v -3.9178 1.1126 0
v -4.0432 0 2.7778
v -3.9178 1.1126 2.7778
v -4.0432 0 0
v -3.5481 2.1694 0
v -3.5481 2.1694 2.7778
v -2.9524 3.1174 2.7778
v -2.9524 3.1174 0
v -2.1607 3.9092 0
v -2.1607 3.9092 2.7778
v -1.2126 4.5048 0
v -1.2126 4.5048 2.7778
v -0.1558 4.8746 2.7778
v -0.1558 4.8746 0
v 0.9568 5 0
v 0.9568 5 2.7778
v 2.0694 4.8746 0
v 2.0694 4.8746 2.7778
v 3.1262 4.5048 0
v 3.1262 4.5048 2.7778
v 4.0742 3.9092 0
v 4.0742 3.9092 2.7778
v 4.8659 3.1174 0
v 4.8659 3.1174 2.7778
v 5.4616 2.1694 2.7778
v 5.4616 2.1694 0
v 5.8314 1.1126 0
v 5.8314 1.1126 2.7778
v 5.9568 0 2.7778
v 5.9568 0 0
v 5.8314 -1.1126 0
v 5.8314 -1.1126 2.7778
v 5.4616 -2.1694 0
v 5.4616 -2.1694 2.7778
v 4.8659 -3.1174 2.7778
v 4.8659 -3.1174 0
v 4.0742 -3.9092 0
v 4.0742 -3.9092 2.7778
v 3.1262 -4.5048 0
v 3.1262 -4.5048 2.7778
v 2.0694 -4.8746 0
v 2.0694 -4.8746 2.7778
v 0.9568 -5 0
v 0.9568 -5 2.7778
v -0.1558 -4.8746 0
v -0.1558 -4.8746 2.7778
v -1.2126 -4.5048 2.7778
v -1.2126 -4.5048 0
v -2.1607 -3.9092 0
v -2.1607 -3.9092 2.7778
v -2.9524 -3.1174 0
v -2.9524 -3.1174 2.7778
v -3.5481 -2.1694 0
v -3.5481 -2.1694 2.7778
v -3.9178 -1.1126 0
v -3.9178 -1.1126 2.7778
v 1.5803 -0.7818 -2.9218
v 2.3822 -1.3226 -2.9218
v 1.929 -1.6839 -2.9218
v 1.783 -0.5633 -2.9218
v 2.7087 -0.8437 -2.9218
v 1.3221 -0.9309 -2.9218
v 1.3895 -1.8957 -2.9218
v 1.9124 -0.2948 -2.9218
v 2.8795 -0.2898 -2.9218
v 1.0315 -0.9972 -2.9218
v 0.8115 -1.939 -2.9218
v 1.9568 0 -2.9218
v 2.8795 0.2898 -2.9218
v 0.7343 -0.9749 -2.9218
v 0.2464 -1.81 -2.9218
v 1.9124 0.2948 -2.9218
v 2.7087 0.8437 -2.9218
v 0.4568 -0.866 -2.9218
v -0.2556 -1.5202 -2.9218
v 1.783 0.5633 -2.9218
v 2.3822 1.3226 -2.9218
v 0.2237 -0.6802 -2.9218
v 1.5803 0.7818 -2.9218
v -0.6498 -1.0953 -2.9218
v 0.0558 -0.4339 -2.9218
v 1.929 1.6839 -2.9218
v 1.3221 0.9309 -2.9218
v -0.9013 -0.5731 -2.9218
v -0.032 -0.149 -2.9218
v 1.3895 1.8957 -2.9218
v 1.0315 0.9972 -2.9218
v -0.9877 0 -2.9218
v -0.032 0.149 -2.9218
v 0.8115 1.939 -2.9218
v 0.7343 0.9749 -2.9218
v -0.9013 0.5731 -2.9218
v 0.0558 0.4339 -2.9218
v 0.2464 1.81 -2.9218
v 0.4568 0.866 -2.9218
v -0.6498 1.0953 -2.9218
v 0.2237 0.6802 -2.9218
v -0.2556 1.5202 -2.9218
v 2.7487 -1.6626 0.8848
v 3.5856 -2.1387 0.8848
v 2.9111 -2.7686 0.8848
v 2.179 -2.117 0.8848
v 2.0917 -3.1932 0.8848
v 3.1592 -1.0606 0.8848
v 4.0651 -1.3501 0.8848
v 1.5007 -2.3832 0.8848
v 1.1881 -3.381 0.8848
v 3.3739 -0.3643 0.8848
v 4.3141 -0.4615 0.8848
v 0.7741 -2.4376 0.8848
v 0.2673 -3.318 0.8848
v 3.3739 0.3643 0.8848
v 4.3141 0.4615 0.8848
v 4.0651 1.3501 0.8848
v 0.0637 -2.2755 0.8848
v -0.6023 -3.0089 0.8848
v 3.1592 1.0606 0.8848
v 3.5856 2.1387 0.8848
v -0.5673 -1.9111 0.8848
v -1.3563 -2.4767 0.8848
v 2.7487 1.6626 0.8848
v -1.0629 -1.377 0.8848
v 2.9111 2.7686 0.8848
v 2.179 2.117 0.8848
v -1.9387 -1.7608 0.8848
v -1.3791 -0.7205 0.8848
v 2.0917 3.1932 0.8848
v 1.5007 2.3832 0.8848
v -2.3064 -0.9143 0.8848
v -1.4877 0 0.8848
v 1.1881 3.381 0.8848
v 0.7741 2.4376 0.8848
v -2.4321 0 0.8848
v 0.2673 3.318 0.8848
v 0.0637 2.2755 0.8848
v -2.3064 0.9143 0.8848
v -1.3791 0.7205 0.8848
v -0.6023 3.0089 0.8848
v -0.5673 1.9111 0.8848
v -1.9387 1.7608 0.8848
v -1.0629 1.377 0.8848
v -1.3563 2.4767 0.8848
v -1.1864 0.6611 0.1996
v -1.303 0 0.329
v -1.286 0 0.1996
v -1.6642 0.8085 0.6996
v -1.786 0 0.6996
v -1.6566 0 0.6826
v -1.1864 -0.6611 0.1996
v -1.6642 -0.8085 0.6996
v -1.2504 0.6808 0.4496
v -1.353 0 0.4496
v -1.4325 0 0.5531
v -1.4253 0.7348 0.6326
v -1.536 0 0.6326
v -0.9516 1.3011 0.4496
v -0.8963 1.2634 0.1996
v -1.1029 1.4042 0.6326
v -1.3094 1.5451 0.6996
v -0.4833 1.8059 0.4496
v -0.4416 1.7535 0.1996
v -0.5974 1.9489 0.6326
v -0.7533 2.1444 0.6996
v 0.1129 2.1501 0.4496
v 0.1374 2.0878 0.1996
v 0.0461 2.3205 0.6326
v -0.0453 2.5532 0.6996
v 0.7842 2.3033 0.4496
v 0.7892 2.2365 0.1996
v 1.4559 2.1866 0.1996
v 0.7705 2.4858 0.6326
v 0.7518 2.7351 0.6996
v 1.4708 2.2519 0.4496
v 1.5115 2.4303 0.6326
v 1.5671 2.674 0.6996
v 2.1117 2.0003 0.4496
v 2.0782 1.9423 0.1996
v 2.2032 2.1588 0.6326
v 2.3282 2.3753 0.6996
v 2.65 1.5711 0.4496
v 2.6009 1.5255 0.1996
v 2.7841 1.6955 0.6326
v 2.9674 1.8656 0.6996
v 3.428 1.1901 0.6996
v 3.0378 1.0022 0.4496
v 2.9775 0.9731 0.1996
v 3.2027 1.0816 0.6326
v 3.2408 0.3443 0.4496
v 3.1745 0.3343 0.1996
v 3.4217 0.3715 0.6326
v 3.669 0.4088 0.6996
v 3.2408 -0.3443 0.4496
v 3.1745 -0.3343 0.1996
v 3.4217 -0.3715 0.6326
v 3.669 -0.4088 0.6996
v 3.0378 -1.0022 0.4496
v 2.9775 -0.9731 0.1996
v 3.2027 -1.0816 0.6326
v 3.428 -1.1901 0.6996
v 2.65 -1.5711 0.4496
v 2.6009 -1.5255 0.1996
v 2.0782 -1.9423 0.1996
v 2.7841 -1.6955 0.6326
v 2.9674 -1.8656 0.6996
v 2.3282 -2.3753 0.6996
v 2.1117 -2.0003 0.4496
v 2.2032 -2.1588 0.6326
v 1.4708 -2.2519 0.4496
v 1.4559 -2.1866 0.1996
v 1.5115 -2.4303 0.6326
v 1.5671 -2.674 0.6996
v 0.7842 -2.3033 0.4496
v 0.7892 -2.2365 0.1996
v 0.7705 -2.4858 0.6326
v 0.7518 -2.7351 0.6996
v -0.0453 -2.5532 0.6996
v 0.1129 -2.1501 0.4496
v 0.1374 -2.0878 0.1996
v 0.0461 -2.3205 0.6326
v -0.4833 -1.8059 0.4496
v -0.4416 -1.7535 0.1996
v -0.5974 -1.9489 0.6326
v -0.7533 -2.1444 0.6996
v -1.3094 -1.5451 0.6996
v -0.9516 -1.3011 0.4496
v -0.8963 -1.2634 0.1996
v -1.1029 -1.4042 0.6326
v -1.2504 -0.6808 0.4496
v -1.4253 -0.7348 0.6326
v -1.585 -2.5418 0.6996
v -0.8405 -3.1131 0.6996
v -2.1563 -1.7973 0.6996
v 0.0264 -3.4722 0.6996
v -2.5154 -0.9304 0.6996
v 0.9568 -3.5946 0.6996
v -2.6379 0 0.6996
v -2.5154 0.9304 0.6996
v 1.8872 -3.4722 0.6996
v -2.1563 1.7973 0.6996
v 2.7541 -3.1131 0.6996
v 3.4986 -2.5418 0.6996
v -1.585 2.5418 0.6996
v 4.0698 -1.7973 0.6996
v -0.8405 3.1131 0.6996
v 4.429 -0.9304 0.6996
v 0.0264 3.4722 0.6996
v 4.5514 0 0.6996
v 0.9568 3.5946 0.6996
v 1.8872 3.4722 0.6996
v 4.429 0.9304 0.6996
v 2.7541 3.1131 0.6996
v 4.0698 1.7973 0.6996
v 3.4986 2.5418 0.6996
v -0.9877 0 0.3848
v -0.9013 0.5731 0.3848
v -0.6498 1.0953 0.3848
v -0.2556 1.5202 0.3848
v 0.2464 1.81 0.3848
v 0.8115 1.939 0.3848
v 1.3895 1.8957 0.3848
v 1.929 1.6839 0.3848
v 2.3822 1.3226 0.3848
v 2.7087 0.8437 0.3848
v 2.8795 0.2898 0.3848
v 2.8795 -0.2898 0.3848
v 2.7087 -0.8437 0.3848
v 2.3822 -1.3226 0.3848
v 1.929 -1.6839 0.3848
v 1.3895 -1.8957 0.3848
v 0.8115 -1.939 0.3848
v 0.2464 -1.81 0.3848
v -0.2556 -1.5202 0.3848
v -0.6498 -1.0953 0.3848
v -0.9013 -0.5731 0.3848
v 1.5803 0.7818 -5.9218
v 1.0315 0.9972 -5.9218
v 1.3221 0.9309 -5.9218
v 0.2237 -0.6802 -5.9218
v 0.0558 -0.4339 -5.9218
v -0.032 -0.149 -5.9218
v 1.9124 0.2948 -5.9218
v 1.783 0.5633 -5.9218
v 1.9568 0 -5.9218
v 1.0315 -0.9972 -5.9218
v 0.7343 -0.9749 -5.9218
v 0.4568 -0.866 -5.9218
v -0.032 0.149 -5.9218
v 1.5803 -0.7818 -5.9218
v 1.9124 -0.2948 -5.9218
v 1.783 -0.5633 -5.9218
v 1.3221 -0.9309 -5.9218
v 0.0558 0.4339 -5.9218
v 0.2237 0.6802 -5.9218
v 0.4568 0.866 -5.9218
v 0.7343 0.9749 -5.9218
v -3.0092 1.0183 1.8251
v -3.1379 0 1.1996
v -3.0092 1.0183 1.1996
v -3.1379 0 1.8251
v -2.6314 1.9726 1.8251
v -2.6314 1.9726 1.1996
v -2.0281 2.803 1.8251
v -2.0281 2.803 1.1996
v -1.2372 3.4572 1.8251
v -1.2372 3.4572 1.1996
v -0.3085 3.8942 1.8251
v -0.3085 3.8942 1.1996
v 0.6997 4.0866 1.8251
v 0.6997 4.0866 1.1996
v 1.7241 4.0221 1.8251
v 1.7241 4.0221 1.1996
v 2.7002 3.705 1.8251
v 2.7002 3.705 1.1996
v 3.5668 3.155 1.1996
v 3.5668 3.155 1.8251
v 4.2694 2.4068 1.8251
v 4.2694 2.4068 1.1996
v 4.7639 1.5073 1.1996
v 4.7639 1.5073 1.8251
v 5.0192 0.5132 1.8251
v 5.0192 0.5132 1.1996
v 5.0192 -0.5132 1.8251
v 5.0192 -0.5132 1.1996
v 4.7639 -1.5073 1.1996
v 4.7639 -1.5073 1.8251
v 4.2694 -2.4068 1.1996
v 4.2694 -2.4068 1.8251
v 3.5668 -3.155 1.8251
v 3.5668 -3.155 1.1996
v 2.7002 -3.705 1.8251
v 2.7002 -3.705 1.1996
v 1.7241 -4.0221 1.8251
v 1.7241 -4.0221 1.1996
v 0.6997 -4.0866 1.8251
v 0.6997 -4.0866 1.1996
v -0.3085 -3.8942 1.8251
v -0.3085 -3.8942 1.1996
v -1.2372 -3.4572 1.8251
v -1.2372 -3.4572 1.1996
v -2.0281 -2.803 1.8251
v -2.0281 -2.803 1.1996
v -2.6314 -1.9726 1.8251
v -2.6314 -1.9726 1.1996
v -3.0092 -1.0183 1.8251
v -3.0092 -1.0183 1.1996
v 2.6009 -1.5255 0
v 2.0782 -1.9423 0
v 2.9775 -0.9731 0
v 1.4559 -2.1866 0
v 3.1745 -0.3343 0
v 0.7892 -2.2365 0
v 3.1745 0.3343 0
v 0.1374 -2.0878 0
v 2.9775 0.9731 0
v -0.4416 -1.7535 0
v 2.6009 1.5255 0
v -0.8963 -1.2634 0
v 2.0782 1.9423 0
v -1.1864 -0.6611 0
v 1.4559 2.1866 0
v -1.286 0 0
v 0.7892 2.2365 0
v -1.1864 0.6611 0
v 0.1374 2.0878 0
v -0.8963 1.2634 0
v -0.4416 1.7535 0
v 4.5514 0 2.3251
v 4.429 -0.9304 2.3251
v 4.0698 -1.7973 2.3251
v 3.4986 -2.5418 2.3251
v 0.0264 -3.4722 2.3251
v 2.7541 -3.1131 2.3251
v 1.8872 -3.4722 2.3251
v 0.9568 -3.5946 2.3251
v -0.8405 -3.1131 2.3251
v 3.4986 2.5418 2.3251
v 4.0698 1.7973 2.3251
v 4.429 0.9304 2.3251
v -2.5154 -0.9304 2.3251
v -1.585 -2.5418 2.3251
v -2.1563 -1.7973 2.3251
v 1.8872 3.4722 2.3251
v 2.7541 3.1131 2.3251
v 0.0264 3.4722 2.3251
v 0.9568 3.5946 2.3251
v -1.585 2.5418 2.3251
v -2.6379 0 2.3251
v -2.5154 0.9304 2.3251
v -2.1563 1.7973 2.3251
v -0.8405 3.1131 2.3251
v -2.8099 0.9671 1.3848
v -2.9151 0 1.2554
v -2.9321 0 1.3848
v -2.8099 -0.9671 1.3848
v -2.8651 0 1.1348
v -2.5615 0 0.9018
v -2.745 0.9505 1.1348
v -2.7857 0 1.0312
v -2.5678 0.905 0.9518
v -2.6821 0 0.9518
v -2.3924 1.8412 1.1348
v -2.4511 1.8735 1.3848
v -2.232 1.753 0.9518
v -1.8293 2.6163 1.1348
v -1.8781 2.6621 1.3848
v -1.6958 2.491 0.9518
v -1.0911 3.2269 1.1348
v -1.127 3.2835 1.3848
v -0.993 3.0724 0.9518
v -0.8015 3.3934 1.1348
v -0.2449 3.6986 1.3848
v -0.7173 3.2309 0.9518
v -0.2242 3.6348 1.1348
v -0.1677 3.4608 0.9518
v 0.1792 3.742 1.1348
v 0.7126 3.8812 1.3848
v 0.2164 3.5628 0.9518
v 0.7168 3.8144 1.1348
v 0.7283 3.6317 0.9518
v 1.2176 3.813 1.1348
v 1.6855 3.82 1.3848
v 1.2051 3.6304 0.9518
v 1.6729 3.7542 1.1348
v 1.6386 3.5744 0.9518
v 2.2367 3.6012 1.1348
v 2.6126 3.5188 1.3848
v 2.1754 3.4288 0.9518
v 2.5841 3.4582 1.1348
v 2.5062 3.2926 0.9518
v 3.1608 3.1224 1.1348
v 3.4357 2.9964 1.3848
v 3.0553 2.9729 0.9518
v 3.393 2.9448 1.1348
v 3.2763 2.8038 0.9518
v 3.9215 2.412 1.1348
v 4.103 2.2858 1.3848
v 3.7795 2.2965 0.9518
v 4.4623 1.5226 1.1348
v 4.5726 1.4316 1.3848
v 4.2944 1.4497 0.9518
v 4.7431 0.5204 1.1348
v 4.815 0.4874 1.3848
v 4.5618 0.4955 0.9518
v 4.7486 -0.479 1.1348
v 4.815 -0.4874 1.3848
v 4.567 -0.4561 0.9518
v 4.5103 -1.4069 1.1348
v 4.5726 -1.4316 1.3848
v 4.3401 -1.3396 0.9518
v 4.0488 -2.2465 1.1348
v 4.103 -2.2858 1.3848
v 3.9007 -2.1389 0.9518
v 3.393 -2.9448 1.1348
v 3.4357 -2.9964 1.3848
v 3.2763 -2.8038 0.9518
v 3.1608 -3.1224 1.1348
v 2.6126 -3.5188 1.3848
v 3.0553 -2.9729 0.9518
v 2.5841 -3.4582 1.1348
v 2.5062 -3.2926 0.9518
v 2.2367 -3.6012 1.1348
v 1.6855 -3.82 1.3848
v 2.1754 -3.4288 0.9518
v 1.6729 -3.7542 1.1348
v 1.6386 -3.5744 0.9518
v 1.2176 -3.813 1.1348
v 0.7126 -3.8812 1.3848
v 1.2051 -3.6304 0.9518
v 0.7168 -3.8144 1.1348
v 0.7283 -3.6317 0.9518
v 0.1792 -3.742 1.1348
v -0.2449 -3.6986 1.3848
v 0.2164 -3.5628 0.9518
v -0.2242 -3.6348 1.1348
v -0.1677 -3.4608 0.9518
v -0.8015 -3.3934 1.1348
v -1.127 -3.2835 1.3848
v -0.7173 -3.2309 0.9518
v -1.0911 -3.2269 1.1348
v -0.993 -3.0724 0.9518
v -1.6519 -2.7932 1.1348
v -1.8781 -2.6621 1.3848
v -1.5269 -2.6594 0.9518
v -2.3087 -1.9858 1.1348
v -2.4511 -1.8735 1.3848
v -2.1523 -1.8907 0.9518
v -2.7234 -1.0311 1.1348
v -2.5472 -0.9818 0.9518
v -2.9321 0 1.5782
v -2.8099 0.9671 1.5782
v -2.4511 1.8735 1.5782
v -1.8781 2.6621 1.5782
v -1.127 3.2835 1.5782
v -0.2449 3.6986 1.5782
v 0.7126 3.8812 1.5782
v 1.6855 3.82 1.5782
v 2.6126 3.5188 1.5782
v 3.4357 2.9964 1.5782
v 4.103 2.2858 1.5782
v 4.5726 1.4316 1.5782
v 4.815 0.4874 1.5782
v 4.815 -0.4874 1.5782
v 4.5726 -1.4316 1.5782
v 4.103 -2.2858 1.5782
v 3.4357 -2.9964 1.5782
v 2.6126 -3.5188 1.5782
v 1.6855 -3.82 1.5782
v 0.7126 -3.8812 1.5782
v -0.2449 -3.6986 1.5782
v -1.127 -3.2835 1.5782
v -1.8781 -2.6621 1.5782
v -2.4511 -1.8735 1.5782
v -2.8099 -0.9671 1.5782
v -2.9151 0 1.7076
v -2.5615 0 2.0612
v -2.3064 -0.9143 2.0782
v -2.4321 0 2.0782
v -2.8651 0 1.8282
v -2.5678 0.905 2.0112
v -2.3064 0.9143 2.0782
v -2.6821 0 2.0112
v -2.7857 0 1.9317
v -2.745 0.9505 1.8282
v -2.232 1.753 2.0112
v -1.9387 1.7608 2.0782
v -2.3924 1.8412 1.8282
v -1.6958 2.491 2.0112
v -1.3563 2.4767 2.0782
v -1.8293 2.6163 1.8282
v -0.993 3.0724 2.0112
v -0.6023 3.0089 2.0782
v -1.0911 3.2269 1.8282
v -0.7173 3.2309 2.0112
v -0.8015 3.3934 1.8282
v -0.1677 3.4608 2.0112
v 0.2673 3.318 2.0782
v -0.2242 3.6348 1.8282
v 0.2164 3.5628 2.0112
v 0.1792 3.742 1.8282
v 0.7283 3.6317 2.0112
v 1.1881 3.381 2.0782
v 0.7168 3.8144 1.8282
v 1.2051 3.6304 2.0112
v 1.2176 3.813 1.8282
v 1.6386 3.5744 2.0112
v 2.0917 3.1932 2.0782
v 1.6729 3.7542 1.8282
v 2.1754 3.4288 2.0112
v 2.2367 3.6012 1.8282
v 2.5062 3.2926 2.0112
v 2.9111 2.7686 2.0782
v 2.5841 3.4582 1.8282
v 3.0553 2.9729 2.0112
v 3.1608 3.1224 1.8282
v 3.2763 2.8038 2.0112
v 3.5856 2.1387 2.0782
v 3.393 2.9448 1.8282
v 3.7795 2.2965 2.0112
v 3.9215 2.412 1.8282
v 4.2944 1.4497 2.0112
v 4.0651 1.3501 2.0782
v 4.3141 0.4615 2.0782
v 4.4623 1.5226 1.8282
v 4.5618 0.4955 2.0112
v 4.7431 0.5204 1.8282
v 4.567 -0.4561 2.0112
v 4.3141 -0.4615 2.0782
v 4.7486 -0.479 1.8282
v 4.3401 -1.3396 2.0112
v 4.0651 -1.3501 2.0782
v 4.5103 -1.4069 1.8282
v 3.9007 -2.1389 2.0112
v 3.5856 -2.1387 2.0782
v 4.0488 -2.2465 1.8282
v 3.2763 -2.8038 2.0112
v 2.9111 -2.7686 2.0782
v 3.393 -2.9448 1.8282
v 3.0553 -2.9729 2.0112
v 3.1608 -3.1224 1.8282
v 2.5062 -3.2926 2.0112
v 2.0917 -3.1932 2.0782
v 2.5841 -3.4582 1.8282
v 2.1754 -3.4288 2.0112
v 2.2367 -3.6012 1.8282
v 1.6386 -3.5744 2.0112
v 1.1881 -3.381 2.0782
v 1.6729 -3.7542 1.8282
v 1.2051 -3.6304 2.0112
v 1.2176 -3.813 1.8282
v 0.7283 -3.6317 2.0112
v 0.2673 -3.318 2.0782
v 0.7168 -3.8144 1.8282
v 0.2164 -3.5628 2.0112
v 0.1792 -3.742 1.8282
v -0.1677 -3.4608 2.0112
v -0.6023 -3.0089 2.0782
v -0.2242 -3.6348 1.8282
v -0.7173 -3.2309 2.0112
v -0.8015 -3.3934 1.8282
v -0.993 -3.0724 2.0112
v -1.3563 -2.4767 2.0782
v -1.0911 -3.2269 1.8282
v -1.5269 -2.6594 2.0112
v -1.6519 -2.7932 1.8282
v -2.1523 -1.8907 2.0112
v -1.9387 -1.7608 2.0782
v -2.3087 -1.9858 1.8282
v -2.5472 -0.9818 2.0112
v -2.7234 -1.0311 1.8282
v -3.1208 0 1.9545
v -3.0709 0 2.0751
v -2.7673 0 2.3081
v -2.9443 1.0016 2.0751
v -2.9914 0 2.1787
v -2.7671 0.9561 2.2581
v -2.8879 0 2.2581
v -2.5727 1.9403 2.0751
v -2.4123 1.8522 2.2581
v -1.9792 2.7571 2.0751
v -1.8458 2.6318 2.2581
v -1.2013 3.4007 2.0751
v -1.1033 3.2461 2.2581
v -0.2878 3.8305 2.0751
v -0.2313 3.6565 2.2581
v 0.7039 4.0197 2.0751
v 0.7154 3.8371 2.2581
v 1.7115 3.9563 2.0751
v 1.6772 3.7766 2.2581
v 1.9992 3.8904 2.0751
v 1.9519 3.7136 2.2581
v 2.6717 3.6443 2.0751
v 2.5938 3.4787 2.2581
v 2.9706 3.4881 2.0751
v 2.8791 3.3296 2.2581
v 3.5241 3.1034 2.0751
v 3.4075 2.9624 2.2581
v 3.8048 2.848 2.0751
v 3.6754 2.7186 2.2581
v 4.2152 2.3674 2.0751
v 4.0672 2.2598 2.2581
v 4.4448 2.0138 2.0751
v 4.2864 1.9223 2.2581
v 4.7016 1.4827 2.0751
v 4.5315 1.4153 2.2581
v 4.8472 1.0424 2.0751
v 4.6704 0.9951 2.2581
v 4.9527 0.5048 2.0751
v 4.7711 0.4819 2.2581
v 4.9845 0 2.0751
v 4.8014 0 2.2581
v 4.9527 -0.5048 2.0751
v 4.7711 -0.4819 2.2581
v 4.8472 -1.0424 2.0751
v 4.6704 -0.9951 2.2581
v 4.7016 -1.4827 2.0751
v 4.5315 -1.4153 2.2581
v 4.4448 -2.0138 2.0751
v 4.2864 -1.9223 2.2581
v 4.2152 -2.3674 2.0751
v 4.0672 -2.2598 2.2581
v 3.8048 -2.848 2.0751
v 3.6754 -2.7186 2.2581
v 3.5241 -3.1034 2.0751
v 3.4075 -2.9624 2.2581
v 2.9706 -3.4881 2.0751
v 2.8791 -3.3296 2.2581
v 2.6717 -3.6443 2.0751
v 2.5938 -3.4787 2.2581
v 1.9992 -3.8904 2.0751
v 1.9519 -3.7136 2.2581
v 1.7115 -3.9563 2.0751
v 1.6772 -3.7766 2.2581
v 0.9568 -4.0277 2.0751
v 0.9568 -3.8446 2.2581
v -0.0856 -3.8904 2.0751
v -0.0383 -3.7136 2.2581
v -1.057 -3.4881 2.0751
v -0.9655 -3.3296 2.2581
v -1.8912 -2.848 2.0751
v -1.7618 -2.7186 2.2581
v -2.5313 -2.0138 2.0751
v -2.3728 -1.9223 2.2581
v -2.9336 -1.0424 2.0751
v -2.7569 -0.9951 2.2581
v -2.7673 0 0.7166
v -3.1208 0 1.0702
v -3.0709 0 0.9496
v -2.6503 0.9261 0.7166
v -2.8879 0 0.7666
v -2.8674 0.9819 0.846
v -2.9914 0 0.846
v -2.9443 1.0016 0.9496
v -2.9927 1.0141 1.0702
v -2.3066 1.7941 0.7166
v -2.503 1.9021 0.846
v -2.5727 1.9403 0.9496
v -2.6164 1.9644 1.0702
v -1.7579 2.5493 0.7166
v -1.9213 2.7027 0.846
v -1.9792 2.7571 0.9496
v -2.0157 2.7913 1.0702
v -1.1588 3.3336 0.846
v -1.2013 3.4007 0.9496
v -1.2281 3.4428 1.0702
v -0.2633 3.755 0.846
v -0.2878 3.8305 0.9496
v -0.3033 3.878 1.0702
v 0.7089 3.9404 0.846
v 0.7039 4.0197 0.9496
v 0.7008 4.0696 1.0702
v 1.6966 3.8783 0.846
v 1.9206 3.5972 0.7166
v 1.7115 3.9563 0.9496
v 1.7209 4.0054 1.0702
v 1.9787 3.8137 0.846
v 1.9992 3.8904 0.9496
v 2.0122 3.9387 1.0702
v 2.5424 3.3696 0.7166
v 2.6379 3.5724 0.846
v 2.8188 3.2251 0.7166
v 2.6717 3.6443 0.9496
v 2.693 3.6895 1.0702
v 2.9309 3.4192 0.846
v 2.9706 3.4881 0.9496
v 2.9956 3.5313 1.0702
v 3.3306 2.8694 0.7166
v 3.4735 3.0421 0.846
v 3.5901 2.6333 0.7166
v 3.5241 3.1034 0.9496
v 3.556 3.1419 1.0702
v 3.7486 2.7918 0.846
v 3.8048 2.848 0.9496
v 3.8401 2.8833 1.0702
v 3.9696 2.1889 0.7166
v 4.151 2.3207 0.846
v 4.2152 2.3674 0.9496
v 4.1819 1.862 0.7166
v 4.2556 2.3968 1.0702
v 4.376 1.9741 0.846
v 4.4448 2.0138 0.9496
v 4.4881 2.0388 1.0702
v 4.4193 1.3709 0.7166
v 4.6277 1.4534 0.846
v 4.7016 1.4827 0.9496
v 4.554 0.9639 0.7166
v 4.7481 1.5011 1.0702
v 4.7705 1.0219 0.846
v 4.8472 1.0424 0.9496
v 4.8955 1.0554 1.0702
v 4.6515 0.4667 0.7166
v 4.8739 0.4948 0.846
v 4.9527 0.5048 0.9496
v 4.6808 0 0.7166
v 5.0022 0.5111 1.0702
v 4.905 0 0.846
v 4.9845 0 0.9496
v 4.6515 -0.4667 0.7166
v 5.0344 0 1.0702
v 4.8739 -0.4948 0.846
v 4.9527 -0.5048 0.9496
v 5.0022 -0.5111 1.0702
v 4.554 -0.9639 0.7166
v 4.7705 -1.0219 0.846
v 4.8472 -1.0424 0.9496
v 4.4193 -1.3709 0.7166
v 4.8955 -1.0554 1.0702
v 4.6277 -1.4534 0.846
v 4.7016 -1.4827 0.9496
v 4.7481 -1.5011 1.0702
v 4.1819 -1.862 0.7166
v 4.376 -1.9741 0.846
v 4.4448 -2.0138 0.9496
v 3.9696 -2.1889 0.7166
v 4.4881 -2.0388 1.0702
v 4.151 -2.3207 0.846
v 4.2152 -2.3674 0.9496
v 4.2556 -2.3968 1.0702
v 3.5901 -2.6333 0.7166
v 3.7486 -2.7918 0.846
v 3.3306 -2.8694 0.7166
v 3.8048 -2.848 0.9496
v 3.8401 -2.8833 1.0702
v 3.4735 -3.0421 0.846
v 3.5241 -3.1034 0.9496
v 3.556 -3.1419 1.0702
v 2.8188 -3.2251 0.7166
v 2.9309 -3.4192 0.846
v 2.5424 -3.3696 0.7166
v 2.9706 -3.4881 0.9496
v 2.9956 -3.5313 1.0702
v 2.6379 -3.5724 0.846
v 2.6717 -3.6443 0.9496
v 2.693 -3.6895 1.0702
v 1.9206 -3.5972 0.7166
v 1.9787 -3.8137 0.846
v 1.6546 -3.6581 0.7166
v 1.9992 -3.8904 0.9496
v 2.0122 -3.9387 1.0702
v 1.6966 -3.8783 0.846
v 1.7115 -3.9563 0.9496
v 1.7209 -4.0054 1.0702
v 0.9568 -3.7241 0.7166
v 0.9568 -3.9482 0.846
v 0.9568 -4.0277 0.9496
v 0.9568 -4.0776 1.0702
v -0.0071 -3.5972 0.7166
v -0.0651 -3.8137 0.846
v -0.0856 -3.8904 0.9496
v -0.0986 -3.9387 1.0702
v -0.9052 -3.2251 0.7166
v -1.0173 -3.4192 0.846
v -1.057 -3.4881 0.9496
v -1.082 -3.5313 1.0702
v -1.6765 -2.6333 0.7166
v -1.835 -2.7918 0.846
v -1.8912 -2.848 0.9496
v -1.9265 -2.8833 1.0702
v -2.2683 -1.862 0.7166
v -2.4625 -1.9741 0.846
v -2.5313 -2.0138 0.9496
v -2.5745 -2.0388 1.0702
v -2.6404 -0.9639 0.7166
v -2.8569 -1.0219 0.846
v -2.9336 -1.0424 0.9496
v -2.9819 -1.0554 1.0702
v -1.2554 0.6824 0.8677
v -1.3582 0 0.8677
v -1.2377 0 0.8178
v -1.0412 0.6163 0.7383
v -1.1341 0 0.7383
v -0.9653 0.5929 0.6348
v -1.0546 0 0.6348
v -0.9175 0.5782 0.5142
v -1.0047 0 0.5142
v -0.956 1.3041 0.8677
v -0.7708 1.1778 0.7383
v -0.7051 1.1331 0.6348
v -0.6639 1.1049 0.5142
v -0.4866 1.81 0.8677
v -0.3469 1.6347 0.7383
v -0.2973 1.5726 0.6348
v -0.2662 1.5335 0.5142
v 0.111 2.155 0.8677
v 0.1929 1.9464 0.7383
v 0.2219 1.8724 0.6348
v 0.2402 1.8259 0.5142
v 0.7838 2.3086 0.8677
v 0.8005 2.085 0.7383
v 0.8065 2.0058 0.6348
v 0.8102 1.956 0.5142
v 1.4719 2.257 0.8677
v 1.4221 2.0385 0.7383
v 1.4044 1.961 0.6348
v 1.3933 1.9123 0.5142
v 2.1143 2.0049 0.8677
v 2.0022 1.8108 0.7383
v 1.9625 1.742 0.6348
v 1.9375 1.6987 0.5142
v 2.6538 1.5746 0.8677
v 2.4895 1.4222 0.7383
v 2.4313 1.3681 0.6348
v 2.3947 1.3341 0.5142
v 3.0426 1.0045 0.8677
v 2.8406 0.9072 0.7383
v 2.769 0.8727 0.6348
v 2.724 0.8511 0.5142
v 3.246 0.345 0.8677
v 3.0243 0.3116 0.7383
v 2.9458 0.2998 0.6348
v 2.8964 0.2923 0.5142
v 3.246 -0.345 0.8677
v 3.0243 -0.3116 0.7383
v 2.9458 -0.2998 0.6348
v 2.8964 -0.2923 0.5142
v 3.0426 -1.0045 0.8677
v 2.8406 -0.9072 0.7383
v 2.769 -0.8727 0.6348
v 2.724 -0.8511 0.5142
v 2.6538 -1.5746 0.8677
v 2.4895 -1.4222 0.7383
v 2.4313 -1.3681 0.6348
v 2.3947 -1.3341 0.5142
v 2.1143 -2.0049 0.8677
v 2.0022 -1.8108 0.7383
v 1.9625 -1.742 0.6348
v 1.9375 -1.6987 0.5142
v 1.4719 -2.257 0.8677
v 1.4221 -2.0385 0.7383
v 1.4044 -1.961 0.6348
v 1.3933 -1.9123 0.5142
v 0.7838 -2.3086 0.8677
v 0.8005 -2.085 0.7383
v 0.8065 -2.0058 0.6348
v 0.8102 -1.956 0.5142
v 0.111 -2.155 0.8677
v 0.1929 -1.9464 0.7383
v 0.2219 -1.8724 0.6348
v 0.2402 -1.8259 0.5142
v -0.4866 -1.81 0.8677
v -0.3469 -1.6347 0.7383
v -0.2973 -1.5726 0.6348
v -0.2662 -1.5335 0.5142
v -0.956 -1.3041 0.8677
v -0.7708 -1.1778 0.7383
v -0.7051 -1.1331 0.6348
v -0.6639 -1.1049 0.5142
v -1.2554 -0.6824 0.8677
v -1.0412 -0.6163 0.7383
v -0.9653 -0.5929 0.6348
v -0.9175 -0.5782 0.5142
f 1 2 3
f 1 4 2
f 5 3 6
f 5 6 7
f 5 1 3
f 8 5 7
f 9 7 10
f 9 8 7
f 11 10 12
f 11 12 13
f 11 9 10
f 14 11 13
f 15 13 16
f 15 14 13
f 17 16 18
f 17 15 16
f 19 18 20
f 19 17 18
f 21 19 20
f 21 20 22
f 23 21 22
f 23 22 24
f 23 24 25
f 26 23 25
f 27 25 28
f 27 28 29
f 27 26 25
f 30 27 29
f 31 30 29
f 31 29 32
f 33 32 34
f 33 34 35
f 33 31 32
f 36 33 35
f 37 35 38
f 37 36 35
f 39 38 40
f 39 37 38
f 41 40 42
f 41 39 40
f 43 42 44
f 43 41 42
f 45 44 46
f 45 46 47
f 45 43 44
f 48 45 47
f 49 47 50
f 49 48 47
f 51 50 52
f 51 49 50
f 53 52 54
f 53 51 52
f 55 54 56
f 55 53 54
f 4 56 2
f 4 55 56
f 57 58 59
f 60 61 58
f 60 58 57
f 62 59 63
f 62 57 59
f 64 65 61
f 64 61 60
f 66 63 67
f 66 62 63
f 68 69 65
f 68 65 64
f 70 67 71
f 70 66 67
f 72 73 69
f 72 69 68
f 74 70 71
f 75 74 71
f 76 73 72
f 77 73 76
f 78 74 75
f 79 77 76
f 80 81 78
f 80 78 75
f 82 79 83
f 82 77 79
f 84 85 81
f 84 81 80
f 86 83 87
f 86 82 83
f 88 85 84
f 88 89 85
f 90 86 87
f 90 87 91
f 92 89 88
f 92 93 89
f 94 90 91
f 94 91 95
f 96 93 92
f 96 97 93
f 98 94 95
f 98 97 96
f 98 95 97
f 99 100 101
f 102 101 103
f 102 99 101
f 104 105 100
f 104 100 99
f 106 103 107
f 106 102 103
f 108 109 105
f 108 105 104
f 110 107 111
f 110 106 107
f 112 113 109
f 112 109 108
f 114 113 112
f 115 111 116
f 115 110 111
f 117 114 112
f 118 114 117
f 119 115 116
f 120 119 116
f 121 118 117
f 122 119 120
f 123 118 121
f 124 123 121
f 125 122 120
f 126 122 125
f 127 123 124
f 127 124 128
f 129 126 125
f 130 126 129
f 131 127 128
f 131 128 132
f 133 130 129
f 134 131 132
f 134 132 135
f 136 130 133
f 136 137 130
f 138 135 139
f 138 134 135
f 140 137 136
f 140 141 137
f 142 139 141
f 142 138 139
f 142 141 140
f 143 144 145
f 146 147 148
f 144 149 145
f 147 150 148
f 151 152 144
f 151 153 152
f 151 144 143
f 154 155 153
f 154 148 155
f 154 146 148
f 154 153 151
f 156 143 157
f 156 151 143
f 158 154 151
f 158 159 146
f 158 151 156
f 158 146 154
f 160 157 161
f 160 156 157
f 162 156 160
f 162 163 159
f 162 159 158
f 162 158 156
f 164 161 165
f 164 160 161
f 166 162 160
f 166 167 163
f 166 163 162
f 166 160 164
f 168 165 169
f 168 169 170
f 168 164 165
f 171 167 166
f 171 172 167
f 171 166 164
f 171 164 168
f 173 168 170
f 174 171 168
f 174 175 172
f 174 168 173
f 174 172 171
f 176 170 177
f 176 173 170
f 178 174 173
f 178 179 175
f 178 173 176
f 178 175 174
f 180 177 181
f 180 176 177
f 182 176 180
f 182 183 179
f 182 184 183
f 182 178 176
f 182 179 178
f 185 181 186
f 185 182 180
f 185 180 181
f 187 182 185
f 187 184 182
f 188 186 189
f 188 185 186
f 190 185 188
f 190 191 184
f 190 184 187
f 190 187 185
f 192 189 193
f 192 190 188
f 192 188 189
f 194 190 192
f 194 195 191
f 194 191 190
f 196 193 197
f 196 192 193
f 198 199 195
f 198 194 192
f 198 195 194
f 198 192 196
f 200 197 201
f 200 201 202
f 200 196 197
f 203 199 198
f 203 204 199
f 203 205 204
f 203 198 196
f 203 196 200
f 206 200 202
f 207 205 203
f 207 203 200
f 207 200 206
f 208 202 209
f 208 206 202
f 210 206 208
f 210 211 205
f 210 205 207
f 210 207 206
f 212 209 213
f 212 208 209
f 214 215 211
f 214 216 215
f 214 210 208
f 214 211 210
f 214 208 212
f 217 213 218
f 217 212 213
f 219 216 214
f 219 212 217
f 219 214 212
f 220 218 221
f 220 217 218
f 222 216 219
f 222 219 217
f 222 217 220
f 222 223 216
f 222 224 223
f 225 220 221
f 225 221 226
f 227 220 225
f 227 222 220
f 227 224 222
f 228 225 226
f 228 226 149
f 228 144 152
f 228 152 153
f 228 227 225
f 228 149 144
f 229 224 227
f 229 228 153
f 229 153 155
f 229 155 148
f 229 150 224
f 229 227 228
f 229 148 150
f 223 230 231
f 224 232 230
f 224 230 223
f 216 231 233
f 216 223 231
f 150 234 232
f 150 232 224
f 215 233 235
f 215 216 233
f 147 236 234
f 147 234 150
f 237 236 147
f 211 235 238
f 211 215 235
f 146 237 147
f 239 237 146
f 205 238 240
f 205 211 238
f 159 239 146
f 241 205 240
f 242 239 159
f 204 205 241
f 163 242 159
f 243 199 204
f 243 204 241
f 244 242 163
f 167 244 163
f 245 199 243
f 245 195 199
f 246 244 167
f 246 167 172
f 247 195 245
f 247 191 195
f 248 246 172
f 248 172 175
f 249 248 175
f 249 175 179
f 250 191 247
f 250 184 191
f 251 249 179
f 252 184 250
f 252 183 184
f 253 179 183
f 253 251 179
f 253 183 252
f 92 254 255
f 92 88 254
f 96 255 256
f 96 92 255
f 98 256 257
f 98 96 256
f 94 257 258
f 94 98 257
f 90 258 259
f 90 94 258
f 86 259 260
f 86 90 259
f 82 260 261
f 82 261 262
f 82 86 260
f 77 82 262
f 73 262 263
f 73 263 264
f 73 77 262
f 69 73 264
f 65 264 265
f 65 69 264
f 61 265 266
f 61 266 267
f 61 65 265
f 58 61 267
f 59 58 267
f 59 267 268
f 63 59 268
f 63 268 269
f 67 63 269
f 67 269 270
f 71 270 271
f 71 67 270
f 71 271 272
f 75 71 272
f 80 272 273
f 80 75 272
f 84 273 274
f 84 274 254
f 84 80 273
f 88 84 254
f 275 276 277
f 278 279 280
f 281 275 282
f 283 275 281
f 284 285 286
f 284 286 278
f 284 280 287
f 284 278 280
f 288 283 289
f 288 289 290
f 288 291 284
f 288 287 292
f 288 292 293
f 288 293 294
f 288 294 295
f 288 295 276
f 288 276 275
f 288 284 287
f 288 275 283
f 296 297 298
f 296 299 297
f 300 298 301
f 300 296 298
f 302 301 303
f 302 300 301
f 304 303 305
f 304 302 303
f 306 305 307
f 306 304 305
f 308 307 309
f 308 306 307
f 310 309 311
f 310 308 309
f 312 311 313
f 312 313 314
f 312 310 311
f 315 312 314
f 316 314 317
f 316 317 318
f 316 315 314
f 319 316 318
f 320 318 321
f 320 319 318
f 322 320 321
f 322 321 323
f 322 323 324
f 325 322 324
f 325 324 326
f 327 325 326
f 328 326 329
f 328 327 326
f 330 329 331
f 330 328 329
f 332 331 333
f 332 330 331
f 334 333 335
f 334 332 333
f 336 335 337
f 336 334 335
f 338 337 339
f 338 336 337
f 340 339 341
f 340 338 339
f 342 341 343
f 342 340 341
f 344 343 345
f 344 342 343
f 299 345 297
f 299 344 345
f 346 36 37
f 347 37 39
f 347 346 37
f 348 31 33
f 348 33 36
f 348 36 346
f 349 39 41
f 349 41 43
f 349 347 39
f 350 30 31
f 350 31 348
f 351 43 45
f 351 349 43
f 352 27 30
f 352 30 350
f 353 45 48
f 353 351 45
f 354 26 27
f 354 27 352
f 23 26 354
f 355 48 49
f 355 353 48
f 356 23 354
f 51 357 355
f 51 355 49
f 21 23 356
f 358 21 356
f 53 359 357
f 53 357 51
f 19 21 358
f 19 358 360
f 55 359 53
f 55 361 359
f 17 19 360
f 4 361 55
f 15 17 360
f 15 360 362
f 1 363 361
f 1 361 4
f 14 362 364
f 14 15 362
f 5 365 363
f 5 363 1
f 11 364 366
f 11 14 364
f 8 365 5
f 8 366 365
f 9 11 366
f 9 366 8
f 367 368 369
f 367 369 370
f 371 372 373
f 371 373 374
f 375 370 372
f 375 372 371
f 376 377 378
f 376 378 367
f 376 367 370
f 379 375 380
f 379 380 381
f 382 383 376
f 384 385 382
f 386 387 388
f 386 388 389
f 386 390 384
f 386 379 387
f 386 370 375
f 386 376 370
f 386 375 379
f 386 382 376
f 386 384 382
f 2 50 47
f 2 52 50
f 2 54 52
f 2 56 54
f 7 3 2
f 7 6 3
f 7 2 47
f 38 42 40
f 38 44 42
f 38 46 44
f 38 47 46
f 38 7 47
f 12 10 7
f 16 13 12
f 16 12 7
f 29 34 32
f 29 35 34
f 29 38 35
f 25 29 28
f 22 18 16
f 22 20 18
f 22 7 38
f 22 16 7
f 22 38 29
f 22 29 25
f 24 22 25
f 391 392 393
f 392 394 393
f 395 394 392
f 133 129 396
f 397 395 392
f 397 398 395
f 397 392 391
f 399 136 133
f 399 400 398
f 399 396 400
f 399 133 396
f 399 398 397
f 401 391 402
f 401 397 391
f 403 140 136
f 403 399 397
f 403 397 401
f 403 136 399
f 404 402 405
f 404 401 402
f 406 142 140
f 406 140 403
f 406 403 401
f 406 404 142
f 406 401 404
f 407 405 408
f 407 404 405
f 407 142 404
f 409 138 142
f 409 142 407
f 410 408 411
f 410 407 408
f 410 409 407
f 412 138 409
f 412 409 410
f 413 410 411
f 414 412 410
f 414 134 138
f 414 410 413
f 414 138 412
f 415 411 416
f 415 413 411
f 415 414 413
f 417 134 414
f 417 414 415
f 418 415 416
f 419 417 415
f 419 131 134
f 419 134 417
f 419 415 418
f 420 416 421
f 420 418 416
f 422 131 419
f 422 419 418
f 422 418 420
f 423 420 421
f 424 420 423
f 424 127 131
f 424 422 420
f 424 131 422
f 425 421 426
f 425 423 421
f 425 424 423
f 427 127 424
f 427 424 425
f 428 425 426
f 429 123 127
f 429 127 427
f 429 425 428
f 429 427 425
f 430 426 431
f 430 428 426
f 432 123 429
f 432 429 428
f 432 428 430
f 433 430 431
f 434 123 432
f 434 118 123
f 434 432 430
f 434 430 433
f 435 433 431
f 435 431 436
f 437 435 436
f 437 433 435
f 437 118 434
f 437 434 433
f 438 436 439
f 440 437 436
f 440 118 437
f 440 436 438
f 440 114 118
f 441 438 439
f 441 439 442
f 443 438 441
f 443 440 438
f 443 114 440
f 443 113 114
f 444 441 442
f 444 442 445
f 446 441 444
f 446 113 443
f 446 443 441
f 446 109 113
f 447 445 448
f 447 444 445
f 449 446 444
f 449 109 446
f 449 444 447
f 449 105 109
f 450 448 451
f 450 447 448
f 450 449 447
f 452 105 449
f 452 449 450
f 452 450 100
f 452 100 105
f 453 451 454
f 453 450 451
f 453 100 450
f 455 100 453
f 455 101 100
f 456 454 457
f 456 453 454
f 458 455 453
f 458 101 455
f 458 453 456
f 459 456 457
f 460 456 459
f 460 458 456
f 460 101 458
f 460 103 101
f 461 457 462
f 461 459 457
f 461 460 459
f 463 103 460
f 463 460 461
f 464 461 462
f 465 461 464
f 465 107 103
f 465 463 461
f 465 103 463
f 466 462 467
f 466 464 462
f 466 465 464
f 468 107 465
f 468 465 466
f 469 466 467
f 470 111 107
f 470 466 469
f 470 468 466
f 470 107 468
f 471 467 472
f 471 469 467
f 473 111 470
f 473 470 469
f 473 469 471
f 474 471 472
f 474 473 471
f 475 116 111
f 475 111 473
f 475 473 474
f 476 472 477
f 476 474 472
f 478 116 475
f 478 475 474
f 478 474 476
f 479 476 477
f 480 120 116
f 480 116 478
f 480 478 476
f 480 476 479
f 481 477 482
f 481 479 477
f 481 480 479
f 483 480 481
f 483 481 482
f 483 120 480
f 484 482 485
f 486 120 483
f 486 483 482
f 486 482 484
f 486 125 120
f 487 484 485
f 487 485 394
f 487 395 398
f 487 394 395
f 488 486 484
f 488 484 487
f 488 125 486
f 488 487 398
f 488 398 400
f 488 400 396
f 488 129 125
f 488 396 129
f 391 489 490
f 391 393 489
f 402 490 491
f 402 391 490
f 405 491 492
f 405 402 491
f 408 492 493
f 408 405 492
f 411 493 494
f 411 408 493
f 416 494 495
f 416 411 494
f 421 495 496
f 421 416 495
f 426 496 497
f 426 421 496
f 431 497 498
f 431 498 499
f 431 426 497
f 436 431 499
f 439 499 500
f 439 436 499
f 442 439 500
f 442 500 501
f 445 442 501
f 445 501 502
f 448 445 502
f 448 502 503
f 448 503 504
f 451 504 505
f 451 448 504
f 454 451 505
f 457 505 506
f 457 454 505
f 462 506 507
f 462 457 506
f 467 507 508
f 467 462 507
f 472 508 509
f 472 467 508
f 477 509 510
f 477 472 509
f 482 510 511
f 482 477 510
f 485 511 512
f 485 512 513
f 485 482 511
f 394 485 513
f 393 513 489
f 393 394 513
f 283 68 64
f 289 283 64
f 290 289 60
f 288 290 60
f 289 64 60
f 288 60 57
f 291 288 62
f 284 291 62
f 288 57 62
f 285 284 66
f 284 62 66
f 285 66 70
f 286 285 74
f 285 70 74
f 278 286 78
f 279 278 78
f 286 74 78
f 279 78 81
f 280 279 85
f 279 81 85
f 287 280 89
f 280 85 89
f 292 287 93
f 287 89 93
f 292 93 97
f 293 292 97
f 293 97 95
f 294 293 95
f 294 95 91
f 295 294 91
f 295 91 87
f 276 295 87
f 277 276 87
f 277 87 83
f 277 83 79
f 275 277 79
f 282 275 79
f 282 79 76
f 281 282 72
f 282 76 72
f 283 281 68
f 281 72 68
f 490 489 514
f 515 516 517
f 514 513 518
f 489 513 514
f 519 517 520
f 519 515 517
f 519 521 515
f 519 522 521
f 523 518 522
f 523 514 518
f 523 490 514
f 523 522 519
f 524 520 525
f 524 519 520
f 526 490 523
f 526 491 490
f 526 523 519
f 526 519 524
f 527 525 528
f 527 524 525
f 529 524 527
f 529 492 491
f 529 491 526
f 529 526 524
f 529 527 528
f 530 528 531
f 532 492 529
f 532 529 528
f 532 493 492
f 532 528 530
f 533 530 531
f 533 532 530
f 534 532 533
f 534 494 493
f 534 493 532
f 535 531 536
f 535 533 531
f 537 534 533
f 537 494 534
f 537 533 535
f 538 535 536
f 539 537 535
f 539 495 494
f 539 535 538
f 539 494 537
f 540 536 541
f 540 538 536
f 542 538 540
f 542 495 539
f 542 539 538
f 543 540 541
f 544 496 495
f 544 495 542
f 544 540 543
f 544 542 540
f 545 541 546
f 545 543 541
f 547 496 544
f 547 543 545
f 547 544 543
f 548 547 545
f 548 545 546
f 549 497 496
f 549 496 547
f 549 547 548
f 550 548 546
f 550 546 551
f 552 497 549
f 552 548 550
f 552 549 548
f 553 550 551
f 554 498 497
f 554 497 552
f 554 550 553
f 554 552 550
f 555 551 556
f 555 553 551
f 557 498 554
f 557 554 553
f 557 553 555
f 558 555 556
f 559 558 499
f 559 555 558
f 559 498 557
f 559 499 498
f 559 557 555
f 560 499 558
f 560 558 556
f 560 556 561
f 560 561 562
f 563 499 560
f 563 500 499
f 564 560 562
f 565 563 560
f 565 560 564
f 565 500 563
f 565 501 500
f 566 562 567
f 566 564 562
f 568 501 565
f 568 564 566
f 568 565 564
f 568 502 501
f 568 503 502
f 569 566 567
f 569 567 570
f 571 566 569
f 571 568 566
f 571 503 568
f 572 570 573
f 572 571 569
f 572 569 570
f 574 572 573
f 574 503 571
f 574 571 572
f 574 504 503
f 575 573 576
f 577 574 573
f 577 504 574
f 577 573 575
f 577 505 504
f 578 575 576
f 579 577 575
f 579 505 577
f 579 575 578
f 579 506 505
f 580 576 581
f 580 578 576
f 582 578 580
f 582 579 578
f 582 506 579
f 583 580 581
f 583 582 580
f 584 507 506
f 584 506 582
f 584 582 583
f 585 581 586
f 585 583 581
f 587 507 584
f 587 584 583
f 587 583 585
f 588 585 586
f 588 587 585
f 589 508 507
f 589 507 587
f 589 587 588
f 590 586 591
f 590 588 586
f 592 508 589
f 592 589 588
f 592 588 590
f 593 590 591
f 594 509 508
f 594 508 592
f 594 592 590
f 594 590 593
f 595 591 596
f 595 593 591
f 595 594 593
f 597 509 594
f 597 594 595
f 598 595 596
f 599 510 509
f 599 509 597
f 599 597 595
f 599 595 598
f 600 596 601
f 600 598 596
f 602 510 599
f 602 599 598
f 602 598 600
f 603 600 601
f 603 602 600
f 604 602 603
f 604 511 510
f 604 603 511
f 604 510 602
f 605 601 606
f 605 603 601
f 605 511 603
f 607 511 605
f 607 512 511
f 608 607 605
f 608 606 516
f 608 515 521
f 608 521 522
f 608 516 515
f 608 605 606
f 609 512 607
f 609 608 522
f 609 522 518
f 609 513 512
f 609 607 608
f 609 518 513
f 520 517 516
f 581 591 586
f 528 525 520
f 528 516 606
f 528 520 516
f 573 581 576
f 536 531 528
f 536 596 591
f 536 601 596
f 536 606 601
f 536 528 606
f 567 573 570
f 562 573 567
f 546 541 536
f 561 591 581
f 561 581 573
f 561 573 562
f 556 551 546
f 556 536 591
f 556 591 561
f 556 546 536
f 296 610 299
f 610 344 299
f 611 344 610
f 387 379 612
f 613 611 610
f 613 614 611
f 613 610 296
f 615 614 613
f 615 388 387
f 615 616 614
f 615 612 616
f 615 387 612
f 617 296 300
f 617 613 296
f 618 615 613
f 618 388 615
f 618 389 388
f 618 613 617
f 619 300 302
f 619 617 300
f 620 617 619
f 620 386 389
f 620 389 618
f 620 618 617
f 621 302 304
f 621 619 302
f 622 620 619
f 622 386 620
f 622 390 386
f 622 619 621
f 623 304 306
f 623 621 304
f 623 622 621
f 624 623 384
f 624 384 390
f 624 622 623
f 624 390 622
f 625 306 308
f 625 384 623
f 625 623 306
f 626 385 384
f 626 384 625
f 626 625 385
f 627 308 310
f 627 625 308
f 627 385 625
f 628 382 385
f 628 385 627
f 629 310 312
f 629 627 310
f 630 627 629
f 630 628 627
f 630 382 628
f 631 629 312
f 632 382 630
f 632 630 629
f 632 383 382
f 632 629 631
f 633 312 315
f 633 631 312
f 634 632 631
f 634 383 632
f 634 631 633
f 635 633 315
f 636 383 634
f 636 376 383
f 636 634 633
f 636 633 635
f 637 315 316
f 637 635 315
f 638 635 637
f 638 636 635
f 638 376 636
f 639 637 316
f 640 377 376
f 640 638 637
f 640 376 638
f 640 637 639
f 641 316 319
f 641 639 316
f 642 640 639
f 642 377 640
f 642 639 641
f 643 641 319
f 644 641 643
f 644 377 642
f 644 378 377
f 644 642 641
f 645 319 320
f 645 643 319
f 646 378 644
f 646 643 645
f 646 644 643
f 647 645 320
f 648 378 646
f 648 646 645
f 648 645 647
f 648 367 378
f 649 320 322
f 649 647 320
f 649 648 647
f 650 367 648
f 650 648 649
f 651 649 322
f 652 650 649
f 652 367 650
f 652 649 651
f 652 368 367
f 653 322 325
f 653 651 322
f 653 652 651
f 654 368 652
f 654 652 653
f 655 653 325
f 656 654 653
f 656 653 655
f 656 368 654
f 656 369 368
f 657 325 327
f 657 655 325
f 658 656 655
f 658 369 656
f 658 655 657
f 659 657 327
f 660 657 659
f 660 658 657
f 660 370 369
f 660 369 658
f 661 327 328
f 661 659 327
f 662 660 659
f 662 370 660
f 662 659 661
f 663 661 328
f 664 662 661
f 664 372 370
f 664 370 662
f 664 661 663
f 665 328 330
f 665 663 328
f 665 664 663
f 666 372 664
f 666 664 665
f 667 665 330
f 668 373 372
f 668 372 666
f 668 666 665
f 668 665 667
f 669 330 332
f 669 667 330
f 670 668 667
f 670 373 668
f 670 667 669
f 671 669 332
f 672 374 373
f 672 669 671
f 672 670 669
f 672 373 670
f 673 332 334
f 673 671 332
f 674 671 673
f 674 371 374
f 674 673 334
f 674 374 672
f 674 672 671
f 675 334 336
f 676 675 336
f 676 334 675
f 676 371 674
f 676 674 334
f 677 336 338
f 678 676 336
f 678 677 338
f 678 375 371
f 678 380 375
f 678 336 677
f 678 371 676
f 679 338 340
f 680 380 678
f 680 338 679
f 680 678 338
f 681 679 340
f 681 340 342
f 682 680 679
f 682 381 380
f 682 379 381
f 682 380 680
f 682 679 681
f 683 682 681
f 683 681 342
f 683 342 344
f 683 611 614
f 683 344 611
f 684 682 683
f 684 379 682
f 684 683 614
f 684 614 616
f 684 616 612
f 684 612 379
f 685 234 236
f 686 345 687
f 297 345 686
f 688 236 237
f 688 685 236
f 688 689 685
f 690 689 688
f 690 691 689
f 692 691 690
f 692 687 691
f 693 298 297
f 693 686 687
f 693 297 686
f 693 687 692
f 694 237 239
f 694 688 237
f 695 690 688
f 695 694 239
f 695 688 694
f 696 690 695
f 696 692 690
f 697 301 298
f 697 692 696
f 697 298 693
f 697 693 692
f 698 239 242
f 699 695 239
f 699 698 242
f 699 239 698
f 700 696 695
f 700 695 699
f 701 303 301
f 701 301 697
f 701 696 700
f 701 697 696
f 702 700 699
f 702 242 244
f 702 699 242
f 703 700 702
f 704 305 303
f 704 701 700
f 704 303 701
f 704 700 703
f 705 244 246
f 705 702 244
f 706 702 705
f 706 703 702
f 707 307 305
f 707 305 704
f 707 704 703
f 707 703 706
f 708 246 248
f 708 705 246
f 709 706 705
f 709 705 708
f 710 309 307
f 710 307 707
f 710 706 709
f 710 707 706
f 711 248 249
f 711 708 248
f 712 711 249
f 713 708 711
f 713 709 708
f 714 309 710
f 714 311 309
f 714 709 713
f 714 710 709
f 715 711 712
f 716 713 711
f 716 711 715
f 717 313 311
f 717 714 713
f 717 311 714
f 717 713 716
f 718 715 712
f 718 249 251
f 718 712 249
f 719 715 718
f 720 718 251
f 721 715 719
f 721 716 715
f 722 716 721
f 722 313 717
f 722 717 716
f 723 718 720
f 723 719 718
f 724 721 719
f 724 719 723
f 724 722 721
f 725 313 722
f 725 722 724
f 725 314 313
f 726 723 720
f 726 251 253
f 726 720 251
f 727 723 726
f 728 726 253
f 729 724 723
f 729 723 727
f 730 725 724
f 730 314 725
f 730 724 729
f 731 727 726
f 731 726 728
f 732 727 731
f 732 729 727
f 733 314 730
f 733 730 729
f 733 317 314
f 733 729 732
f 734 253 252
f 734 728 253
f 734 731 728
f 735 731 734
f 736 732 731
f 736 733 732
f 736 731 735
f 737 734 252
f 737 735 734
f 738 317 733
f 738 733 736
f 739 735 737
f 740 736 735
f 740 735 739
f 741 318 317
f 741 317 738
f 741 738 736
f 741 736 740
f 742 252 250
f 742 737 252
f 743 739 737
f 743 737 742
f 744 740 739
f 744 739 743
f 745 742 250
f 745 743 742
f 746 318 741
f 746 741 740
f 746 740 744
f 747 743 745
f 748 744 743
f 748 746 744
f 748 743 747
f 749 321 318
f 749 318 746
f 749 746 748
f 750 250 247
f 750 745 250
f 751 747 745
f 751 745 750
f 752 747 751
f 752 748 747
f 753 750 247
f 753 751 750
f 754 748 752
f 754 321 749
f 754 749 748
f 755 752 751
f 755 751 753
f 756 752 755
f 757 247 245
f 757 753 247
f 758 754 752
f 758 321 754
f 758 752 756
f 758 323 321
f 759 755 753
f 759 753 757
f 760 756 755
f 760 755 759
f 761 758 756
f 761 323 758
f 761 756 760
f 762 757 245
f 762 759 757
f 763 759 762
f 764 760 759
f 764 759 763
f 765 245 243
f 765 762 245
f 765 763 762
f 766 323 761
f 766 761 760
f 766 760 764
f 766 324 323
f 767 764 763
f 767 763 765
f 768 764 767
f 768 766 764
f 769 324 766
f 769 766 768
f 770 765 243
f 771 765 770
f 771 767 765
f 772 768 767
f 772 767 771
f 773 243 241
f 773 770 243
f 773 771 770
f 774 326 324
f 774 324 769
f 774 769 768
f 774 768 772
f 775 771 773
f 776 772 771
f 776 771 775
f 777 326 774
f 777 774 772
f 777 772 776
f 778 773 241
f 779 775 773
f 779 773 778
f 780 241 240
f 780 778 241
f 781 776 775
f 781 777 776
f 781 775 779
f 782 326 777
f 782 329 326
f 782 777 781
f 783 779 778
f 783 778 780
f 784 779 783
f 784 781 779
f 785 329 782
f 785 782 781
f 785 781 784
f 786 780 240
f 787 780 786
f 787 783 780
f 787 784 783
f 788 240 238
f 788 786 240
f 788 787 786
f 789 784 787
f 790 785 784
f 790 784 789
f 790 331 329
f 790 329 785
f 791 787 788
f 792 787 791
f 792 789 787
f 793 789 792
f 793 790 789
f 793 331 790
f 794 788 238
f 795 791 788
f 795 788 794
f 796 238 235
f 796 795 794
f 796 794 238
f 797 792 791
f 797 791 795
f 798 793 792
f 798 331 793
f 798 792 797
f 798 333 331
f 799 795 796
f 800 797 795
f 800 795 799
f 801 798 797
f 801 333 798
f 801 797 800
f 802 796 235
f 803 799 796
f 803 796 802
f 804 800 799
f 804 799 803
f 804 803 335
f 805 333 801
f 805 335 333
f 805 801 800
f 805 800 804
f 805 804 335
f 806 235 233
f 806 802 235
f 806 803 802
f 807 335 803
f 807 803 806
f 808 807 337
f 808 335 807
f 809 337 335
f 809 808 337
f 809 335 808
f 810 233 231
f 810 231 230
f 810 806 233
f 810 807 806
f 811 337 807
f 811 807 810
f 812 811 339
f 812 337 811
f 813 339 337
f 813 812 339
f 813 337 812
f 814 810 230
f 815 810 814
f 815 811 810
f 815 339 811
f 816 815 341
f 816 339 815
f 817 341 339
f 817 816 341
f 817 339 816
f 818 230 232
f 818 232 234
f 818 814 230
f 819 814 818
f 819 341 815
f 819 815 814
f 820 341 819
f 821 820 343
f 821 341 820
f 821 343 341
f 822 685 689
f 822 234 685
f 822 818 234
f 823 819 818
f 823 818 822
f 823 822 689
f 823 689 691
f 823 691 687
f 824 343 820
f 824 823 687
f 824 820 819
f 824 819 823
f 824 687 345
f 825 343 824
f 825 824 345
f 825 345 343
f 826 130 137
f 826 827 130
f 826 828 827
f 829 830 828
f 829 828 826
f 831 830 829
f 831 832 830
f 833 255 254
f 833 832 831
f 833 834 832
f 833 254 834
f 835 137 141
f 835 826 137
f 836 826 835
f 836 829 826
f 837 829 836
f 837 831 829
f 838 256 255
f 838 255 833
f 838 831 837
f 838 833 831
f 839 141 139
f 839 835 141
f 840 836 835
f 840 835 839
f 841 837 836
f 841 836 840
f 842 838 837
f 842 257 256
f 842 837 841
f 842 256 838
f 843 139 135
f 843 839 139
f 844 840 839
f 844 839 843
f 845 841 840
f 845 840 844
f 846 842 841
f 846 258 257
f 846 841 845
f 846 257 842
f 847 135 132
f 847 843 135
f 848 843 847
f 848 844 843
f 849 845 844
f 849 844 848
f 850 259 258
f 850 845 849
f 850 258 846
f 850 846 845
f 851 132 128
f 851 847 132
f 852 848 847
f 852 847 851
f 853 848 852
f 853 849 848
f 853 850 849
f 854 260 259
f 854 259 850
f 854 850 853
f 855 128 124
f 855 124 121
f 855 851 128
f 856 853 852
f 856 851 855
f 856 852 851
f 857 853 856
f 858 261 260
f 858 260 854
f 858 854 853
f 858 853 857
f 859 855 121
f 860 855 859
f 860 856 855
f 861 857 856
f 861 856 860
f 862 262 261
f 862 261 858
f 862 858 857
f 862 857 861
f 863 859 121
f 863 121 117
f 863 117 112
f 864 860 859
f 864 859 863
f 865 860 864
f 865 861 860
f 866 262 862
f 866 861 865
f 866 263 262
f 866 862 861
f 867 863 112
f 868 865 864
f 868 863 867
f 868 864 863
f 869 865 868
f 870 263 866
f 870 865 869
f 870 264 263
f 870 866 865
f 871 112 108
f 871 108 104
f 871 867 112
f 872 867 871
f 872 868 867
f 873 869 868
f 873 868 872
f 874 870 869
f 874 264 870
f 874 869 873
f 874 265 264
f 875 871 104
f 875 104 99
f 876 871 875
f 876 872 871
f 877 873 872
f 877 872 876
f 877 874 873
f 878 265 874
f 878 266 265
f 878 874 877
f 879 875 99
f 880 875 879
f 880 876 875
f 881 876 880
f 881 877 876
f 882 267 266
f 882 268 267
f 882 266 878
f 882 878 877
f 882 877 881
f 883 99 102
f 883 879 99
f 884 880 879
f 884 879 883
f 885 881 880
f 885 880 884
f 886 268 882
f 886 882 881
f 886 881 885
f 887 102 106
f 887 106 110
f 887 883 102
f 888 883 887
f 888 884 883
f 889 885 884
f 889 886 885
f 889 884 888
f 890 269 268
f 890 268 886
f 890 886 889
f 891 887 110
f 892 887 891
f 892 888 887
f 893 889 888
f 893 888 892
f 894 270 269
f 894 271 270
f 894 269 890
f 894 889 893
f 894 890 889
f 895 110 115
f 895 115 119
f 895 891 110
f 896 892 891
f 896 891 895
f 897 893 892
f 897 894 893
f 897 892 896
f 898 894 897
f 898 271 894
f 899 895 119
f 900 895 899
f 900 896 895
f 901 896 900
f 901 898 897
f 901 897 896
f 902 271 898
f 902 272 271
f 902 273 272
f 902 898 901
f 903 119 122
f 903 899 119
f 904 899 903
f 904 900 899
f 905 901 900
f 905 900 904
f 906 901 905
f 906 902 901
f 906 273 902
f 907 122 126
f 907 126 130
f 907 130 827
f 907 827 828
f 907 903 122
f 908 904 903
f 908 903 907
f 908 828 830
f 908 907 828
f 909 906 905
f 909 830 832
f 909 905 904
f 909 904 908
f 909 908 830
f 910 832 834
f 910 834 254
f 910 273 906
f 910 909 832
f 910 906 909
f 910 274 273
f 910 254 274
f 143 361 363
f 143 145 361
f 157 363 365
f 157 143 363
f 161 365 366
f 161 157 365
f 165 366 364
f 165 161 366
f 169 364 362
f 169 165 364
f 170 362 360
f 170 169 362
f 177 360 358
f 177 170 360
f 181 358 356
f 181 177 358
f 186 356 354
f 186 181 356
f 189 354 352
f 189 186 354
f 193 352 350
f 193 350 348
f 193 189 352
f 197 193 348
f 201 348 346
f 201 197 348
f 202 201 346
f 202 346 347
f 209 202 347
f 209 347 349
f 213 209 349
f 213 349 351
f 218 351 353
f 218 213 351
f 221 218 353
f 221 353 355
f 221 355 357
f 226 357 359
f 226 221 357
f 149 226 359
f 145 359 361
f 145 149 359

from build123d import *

# Parameters (mm, degrees)
F2_R     = 1
F3_DEPTH = 3


with BuildPart() as f1:
    # F0 (on Front) → F1 (revolve)
    with BuildSketch(Plane.XZ):
        with BuildLine():
            ThreePointArc((-1.286008, 0.199588), (-1.432455, 0.553142), (-1.786008, 0.699588))
            Line((-1.786008, 0.699588), (-2.63786, 0.699588))
            ThreePointArc((-2.63786, 0.699588), (-2.991413, 0.846035), (-3.13786, 1.199588))
            Line((-3.13786, 1.199588), (-3.13786, 1.825103))
            ThreePointArc((-3.13786, 1.825103), (-2.991413, 2.178656), (-2.63786, 2.325103))
            Line((-2.63786, 2.325103), (0.95679, 2.325103))
            Line((0.95679, 2.325103), (0.95679, 2.777778))
            Line((0.95679, 2.777778), (-3.13786, 2.777778))
            Line((-3.13786, 2.777778), (-4.04321, 2.777778))
            Line((-4.04321, 2.777778), (-4.04321, 2.325103))
            Line((-4.04321, 2.325103), (-4.04321, 0.699588))
            Line((-4.04321, 0.699588), (-4.04321, 0))
            Line((-4.04321, 0), (-3.13786, 0))
            Line((-3.13786, 0), (-1.286008, 0))
            Line((-1.286008, 0), (-1.286008, 0.199588))
        make_face()
        with BuildLine():
            Line((-0.987654, 2.078189), (-2.432099, 2.078189))
            ThreePointArc((-2.432099, 2.078189), (-2.785652, 1.931743), (-2.932099, 1.578189))
            Line((-2.932099, 1.578189), (-2.932099, 1.384774))
            ThreePointArc((-2.932099, 1.384774), (-2.785652, 1.03122), (-2.432099, 0.884774))
            Line((-2.432099, 0.884774), (-1.487654, 0.884774))
            ThreePointArc((-1.487654, 0.884774), (-1.134101, 0.738327), (-0.987654, 0.384774))
            Line((-0.987654, 0.384774), (-0.987654, -2.921811))
            Line((-0.987654, -2.921811), (0.95679, -2.921811))
            Line((0.95679, -2.921811), (0.95679, 0.884774))
            Line((0.95679, 0.884774), (0.95679, 2.078189))
            Line((0.95679, 2.078189), (-0.987654, 2.078189))
        make_face()
    revolve(axis=Axis((0.95679, 0, -0.421811), (0, 0, -1)))

    # F2 (on face) → F3 (join)
    with BuildSketch(Plane(origin=(0, 0, -2.921811), x_dir=(1, 0, 0), z_dir=(0, 0, -1))):
        with Locations((0.95679, 0)):
            Circle(F2_R)
    extrude(amount=F3_DEPTH)


solid = f1.part
